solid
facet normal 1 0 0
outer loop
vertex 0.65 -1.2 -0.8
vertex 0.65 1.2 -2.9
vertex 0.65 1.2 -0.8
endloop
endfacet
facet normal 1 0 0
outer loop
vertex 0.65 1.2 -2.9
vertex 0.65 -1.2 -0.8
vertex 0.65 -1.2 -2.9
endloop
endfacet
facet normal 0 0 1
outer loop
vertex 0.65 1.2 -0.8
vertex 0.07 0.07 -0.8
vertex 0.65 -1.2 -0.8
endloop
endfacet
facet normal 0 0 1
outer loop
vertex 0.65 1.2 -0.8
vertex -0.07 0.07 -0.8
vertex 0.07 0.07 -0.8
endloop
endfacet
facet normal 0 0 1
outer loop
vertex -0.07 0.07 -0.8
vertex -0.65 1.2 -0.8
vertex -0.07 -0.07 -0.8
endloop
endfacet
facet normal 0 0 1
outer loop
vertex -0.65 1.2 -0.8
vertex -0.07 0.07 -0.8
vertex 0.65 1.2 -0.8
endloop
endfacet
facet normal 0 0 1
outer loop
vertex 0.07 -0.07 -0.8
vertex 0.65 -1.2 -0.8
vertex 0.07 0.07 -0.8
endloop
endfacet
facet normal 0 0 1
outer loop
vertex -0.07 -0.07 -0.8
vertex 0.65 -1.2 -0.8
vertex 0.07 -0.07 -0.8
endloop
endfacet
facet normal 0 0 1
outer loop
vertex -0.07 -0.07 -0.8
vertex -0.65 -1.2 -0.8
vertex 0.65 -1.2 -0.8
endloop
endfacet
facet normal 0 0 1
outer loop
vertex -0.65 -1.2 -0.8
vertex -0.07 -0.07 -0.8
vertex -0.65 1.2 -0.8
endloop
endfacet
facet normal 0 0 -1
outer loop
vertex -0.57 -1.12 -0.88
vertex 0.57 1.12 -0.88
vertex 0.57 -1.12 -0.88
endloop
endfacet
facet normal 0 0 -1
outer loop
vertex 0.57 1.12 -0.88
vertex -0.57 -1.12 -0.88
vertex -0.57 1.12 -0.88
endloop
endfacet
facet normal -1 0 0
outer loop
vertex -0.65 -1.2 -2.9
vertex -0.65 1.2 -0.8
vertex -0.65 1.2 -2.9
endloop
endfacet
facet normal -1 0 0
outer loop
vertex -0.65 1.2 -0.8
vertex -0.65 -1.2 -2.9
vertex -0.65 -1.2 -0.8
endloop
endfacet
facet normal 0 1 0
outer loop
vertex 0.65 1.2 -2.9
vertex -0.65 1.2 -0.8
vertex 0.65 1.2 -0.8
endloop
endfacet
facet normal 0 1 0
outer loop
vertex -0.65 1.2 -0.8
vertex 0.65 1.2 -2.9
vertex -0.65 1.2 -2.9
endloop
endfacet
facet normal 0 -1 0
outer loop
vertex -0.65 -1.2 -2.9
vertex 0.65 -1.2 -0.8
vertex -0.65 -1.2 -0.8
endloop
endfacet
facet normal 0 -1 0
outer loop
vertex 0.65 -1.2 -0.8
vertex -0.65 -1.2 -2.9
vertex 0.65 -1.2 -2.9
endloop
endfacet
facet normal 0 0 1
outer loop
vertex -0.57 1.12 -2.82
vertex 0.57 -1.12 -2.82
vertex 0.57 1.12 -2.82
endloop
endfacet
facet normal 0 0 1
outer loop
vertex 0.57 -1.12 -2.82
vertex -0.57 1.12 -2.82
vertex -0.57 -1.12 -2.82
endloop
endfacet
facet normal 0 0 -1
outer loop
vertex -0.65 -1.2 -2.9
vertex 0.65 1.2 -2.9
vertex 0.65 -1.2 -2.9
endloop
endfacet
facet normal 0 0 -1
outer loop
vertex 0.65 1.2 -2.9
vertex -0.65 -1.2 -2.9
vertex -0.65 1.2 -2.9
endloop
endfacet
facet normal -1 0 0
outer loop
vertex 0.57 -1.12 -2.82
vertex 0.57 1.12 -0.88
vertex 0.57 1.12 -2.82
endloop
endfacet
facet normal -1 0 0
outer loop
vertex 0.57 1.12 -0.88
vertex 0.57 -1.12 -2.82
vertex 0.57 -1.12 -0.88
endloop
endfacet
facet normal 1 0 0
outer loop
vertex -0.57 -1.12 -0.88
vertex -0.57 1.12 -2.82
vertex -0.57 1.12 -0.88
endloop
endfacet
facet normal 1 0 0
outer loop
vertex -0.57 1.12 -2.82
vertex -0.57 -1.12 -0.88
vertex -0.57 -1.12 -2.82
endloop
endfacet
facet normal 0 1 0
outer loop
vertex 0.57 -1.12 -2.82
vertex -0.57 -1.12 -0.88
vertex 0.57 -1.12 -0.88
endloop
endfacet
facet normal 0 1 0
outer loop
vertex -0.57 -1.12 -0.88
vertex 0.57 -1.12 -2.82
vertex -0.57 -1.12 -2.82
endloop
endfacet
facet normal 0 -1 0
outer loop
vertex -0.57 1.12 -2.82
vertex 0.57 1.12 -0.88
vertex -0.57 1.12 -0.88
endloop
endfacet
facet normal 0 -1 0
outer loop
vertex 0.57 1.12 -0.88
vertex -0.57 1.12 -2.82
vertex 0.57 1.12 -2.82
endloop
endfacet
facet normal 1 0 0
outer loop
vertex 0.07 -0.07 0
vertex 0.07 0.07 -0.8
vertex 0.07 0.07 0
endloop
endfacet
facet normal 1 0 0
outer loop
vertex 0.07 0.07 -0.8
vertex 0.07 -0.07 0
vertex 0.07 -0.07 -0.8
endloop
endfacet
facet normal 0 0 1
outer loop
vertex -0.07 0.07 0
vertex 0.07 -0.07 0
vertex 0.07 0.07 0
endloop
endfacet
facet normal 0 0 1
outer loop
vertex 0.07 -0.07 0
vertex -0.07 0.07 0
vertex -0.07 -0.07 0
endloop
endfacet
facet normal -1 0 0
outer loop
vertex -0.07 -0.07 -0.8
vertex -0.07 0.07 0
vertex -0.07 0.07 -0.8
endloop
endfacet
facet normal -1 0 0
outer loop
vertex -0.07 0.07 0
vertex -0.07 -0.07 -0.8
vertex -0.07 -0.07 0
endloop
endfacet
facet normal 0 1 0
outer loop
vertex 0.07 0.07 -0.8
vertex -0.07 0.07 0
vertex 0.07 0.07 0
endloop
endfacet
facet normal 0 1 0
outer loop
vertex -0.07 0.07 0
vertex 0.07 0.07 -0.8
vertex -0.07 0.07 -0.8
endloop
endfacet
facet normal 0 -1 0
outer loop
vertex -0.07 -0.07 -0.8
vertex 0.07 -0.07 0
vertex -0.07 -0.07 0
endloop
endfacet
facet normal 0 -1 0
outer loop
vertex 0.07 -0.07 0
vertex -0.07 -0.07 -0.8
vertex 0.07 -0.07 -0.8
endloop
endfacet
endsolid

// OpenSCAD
// Monocable detachable (MDG) gondola cabin — 8 passengers in two rows of four.
//
// Conventions, units, and axis docs: see models-src/README.md.
//
//     +X = forward (direction of travel along the cable)
//     +Y = lateral (perpendicular to cable)
//     +Z = up (SCAD Z-up; scad2obj rotates to game Y-up at export)
//
//   Origin sits at the cable-grip point. The entire cabin hangs in -Z.
//   The hanger arm runs from the grip down to the cabin roof; the body
//   hangs below that. Keep colours near white so the per-instance tint
//   (grey = empty, blue = occupied) reads cleanly.

$fn = 12;

// ── Dimensions (metres) ────────────────────────────────────────────────
hanger_thick = 0.14;  // square cross-section of the grip arm
hanger_len   = 0.80;  // grip to cabin roof

cabin_w = 2.40;  // lateral (Y) — fits 4 riders side-by-side at 0.60 m spacing
cabin_d = 1.30;  // along-cable (X) — two facing rows with ~0.30 m knee clearance
cabin_h = 2.10;  // floor to ceiling
wall_t  = 0.08;  // wall thickness

// Divide the side-wall height into three bands.
lower_frac = 0.28;  // solid skirt below windows
win_frac   = 0.47;  // window strip
upper_frac = 0.25;  // solid header above windows (= 1 - lower - win)

lower_h = cabin_h * lower_frac;   // 0.588
win_h   = cabin_h * win_frac;     // 0.987
upper_h = cabin_h * upper_frac;   // 0.525

// Z anchors (everything hangs in -Z).
cabin_top_z = -hanger_len;                           // -0.80
cabin_bot_z = cabin_top_z - cabin_h;                 // -2.90

lower_bot_z = cabin_bot_z;                           // -2.90
lower_top_z = lower_bot_z + lower_h;                 // -2.312
win_bot_z   = lower_top_z;                           // -2.312
win_top_z   = win_bot_z   + win_h;                   // -1.325
upper_bot_z = win_top_z;                             // -1.325  (check: + 0.525 = -0.80 ✓)

lower_ctr_z = (lower_bot_z + lower_top_z) / 2;      // -2.606
win_ctr_z   = (win_bot_z   + win_top_z)   / 2;      // -1.8185
upper_ctr_z = (upper_bot_z + cabin_top_z) / 2;      // -1.0625
cabin_ctr_z = (cabin_top_z + cabin_bot_z) / 2;      // -1.85

// ── Parts ──────────────────────────────────────────────────────────────
module hanger() {
    color("white")
        translate([0, 0, -hanger_len / 2])
            cube([hanger_thick, hanger_thick, hanger_len], center = true);
}

module cabin() {
    // Roof and floor panels (full footprint).
    color("white") {
        translate([0, 0, cabin_top_z - wall_t / 2])
            cube([cabin_d, cabin_w, wall_t], center = true);
        translate([0, 0, cabin_bot_z + wall_t / 2])
            cube([cabin_d, cabin_w, wall_t], center = true);
    }

    // Front and rear walls (±X faces, full height, full width).
    color("white") {
        translate([ cabin_d / 2 - wall_t / 2, 0, cabin_ctr_z])
            cube([wall_t, cabin_w, cabin_h], center = true);
        translate([-cabin_d / 2 + wall_t / 2, 0, cabin_ctr_z])
            cube([wall_t, cabin_w, cabin_h], center = true);
    }

    // Long side walls (±Y faces, parallel to cable direction).
    // Three bands: solid skirt, window strip, solid header.
    for (side = [-1, 1]) {
        y = side * (cabin_w / 2 - wall_t / 2);
        inner_w = cabin_d - 2 * wall_t;  // wall span between front/rear walls

        // Lower solid skirt.
        color("white")
            translate([0, y, lower_ctr_z])
                cube([inner_w, wall_t, lower_h], center = true);

        // Window glass strip.
        color([0.70, 0.88, 1.00])
            translate([0, y, win_ctr_z])
                cube([inner_w, wall_t, win_h], center = true);

        // Upper solid header.
        color("white")
            translate([0, y, upper_ctr_z])
                cube([inner_w, wall_t, upper_h], center = true);
    }
}

module gondola() {
    hanger();
    cabin();
}

gondola();

// ── Passenger seat anchors ─────────────────────────────────────────────
// Eight riders in two rows of four (front row at +X, rear at -X).
// Riders stand; slot_z is the cabin floor level (just above the floor panel).
row_x_front =  0.35;
row_x_rear  = -0.35;
slot_y_outer = 0.90;
slot_y_inner = 0.30;
slot_z       = cabin_bot_z + wall_t;   // -2.82 — standing on the floor

// Front row (slots 0–3, left to right in travel direction).
echo("MOGUL_META", "slot", 0, row_x_front, -slot_y_outer, slot_z);
echo("MOGUL_META", "slot", 1, row_x_front, -slot_y_inner, slot_z);
echo("MOGUL_META", "slot", 2, row_x_front,  slot_y_inner, slot_z);
echo("MOGUL_META", "slot", 3, row_x_front,  slot_y_outer, slot_z);
// Rear row (slots 4–7).
echo("MOGUL_META", "slot", 4, row_x_rear, -slot_y_outer, slot_z);
echo("MOGUL_META", "slot", 5, row_x_rear, -slot_y_inner, slot_z);
echo("MOGUL_META", "slot", 6, row_x_rear,  slot_y_inner, slot_z);
echo("MOGUL_META", "slot", 7, row_x_rear,  slot_y_outer, slot_z);
